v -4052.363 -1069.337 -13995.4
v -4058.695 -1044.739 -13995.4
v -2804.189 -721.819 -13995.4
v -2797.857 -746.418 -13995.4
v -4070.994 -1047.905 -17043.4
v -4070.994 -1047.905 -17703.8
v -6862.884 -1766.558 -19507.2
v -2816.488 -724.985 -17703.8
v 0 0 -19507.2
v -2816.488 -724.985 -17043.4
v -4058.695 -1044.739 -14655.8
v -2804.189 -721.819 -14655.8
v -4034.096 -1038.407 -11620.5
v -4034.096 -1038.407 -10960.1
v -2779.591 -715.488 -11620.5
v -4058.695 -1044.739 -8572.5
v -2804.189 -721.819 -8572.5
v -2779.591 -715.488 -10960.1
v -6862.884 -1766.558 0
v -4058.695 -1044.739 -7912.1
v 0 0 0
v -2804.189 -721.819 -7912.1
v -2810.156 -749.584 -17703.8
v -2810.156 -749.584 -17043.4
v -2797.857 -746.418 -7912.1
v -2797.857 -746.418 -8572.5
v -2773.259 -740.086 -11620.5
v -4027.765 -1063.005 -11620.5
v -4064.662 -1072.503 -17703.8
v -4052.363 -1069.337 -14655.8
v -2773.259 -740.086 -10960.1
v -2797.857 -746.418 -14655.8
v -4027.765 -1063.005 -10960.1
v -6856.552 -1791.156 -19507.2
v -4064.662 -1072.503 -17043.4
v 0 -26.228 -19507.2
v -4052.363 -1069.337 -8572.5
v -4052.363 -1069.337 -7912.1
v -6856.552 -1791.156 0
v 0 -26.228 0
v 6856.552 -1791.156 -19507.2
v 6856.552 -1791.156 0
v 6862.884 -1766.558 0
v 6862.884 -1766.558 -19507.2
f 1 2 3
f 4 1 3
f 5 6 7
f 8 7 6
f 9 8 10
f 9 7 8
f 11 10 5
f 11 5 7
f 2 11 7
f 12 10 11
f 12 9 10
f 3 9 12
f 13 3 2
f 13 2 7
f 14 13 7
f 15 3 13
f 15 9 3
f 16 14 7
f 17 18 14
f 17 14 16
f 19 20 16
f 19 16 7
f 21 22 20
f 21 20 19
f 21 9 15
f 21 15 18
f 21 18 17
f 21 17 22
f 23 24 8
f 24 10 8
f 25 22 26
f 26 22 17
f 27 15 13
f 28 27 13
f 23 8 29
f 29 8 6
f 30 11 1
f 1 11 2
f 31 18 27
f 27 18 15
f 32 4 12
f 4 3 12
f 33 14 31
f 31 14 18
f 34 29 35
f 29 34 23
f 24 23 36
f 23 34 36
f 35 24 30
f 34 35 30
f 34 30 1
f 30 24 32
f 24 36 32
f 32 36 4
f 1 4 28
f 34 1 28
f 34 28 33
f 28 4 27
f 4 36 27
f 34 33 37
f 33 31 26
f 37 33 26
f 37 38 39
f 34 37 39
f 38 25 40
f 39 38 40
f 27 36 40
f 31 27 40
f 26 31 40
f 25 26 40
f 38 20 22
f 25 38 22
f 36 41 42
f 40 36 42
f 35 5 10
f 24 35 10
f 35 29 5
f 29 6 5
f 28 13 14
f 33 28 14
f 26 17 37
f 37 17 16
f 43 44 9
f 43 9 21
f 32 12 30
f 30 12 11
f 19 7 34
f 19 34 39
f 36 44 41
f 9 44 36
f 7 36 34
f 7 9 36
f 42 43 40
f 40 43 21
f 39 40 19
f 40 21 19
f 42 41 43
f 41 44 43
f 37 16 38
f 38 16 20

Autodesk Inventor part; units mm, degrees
ref_plane "YZ Plane" through (0, 0, 0) normal (1, 0, 0) x (0, 1, 0)
ref_plane "XY Plane" through (0, 0, 0) normal (0, 0, 1) x (1, 0, 0)
ref_plane "southPlaneOfRoof" through (0, 0, 0) normal (-0.2492815, 0.9684311, 0) x (0, 0, 1)
ref_plane "norhtPlaneOfRoof" through (0, 0, 0) normal (0.2492815, 0.9684311, 0) x (0, 0, 1)
sketch "Sketch3" plane through (0, 0, 0) normal (-0.2492815, 0.9684311, 0) x (0, 0, 1)
  line L0 (0, 0) -> (-19507.2, 0)
  line L1 (-19507.2, 0) -> (-19507.2, -7086.6)
  line L2 (0, 0) -> (0, -7086.6)
  line L3 (0, -7086.6) -> (0, -25.4)
  line L4 (-19507.2, -7086.6) -> (0, -7086.6)
  line L5 (-17703.8, -4203.7) -> (-17043.4, -4203.7)
  line L6 (-17043.4, -4203.7) -> (-17043.4, -2908.3)
  line L7 (-17043.4, -2908.3) -> (-17703.8, -2908.3)
  line L8 (-17703.8, -2908.3) -> (-17703.8, -4203.7)
  line L9 (-14655.8, -4191) -> (-13995.4, -4191)
  line L10 (-13995.4, -4191) -> (-13995.4, -2895.6)
  line L11 (-13995.4, -2895.6) -> (-14655.8, -2895.6)
  line L12 (-14655.8, -2895.6) -> (-14655.8, -4191)
  line L13 (-11620.5, -4165.6) -> (-10960.1, -4165.6)
  line L14 (-10960.1, -4165.6) -> (-10960.1, -2870.2)
  line L15 (-10960.1, -2870.2) -> (-11620.5, -2870.2)
  line L16 (-11620.5, -2870.2) -> (-11620.5, -4165.6)
  line L17 (-8572.5, -4191) -> (-7912.1, -4191)
  line L18 (-7912.1, -4191) -> (-7912.1, -2895.6)
  line L19 (-7912.1, -2895.6) -> (-8572.5, -2895.6)
  line L20 (-8572.5, -2895.6) -> (-8572.5, -4191)
  dimension "d9" = 19507.2
  dimension "d10" = 7086.6
  dimension "d11" = 7061.2
  dimension "d15" = 660.4
  dimension "d16" = 1295.4
  dimension "d17" = 1803.4
  dimension "d18" = 2387.6
  dimension "d19" = 2374.9
  dimension "d20" = 2387.6
  dimension "d21" = 2908.3
  dimension "d22" = 2895.6
  dimension "d23" = 2870.2
  dimension "d24" = 2895.6
sketch "Sketch4" plane through (0, 0, 0) normal (0.2492815, 0.9684311, 0) x (0, 0, 1)
  line L0 (0, 0) -> (0, 7086.6)
  line L1 (0, 0) -> (-19507.2, 0)
  line L2 (-19507.2, 0) -> (-19507.2, 7086.6)
  line L3 (-19507.2, 7086.6) -> (0, 7086.6)
  dimension "d12" = 7086.6
  dimension "d13" = 19507.2
  dimension "d14" = 7086.6
extrude "Extrusion2" add sketch "Sketch3" against normal blind 25.4
extrude "Extrusion3" add sketch "Sketch4" against normal blind 25.4
equation "\"pitch_4_12\" = 14.435deg"
equation "\"d7\" = pitch_4_12"
equation "\"d8\" = -pitch_4_12"
properties part number "garageRoofV2"
